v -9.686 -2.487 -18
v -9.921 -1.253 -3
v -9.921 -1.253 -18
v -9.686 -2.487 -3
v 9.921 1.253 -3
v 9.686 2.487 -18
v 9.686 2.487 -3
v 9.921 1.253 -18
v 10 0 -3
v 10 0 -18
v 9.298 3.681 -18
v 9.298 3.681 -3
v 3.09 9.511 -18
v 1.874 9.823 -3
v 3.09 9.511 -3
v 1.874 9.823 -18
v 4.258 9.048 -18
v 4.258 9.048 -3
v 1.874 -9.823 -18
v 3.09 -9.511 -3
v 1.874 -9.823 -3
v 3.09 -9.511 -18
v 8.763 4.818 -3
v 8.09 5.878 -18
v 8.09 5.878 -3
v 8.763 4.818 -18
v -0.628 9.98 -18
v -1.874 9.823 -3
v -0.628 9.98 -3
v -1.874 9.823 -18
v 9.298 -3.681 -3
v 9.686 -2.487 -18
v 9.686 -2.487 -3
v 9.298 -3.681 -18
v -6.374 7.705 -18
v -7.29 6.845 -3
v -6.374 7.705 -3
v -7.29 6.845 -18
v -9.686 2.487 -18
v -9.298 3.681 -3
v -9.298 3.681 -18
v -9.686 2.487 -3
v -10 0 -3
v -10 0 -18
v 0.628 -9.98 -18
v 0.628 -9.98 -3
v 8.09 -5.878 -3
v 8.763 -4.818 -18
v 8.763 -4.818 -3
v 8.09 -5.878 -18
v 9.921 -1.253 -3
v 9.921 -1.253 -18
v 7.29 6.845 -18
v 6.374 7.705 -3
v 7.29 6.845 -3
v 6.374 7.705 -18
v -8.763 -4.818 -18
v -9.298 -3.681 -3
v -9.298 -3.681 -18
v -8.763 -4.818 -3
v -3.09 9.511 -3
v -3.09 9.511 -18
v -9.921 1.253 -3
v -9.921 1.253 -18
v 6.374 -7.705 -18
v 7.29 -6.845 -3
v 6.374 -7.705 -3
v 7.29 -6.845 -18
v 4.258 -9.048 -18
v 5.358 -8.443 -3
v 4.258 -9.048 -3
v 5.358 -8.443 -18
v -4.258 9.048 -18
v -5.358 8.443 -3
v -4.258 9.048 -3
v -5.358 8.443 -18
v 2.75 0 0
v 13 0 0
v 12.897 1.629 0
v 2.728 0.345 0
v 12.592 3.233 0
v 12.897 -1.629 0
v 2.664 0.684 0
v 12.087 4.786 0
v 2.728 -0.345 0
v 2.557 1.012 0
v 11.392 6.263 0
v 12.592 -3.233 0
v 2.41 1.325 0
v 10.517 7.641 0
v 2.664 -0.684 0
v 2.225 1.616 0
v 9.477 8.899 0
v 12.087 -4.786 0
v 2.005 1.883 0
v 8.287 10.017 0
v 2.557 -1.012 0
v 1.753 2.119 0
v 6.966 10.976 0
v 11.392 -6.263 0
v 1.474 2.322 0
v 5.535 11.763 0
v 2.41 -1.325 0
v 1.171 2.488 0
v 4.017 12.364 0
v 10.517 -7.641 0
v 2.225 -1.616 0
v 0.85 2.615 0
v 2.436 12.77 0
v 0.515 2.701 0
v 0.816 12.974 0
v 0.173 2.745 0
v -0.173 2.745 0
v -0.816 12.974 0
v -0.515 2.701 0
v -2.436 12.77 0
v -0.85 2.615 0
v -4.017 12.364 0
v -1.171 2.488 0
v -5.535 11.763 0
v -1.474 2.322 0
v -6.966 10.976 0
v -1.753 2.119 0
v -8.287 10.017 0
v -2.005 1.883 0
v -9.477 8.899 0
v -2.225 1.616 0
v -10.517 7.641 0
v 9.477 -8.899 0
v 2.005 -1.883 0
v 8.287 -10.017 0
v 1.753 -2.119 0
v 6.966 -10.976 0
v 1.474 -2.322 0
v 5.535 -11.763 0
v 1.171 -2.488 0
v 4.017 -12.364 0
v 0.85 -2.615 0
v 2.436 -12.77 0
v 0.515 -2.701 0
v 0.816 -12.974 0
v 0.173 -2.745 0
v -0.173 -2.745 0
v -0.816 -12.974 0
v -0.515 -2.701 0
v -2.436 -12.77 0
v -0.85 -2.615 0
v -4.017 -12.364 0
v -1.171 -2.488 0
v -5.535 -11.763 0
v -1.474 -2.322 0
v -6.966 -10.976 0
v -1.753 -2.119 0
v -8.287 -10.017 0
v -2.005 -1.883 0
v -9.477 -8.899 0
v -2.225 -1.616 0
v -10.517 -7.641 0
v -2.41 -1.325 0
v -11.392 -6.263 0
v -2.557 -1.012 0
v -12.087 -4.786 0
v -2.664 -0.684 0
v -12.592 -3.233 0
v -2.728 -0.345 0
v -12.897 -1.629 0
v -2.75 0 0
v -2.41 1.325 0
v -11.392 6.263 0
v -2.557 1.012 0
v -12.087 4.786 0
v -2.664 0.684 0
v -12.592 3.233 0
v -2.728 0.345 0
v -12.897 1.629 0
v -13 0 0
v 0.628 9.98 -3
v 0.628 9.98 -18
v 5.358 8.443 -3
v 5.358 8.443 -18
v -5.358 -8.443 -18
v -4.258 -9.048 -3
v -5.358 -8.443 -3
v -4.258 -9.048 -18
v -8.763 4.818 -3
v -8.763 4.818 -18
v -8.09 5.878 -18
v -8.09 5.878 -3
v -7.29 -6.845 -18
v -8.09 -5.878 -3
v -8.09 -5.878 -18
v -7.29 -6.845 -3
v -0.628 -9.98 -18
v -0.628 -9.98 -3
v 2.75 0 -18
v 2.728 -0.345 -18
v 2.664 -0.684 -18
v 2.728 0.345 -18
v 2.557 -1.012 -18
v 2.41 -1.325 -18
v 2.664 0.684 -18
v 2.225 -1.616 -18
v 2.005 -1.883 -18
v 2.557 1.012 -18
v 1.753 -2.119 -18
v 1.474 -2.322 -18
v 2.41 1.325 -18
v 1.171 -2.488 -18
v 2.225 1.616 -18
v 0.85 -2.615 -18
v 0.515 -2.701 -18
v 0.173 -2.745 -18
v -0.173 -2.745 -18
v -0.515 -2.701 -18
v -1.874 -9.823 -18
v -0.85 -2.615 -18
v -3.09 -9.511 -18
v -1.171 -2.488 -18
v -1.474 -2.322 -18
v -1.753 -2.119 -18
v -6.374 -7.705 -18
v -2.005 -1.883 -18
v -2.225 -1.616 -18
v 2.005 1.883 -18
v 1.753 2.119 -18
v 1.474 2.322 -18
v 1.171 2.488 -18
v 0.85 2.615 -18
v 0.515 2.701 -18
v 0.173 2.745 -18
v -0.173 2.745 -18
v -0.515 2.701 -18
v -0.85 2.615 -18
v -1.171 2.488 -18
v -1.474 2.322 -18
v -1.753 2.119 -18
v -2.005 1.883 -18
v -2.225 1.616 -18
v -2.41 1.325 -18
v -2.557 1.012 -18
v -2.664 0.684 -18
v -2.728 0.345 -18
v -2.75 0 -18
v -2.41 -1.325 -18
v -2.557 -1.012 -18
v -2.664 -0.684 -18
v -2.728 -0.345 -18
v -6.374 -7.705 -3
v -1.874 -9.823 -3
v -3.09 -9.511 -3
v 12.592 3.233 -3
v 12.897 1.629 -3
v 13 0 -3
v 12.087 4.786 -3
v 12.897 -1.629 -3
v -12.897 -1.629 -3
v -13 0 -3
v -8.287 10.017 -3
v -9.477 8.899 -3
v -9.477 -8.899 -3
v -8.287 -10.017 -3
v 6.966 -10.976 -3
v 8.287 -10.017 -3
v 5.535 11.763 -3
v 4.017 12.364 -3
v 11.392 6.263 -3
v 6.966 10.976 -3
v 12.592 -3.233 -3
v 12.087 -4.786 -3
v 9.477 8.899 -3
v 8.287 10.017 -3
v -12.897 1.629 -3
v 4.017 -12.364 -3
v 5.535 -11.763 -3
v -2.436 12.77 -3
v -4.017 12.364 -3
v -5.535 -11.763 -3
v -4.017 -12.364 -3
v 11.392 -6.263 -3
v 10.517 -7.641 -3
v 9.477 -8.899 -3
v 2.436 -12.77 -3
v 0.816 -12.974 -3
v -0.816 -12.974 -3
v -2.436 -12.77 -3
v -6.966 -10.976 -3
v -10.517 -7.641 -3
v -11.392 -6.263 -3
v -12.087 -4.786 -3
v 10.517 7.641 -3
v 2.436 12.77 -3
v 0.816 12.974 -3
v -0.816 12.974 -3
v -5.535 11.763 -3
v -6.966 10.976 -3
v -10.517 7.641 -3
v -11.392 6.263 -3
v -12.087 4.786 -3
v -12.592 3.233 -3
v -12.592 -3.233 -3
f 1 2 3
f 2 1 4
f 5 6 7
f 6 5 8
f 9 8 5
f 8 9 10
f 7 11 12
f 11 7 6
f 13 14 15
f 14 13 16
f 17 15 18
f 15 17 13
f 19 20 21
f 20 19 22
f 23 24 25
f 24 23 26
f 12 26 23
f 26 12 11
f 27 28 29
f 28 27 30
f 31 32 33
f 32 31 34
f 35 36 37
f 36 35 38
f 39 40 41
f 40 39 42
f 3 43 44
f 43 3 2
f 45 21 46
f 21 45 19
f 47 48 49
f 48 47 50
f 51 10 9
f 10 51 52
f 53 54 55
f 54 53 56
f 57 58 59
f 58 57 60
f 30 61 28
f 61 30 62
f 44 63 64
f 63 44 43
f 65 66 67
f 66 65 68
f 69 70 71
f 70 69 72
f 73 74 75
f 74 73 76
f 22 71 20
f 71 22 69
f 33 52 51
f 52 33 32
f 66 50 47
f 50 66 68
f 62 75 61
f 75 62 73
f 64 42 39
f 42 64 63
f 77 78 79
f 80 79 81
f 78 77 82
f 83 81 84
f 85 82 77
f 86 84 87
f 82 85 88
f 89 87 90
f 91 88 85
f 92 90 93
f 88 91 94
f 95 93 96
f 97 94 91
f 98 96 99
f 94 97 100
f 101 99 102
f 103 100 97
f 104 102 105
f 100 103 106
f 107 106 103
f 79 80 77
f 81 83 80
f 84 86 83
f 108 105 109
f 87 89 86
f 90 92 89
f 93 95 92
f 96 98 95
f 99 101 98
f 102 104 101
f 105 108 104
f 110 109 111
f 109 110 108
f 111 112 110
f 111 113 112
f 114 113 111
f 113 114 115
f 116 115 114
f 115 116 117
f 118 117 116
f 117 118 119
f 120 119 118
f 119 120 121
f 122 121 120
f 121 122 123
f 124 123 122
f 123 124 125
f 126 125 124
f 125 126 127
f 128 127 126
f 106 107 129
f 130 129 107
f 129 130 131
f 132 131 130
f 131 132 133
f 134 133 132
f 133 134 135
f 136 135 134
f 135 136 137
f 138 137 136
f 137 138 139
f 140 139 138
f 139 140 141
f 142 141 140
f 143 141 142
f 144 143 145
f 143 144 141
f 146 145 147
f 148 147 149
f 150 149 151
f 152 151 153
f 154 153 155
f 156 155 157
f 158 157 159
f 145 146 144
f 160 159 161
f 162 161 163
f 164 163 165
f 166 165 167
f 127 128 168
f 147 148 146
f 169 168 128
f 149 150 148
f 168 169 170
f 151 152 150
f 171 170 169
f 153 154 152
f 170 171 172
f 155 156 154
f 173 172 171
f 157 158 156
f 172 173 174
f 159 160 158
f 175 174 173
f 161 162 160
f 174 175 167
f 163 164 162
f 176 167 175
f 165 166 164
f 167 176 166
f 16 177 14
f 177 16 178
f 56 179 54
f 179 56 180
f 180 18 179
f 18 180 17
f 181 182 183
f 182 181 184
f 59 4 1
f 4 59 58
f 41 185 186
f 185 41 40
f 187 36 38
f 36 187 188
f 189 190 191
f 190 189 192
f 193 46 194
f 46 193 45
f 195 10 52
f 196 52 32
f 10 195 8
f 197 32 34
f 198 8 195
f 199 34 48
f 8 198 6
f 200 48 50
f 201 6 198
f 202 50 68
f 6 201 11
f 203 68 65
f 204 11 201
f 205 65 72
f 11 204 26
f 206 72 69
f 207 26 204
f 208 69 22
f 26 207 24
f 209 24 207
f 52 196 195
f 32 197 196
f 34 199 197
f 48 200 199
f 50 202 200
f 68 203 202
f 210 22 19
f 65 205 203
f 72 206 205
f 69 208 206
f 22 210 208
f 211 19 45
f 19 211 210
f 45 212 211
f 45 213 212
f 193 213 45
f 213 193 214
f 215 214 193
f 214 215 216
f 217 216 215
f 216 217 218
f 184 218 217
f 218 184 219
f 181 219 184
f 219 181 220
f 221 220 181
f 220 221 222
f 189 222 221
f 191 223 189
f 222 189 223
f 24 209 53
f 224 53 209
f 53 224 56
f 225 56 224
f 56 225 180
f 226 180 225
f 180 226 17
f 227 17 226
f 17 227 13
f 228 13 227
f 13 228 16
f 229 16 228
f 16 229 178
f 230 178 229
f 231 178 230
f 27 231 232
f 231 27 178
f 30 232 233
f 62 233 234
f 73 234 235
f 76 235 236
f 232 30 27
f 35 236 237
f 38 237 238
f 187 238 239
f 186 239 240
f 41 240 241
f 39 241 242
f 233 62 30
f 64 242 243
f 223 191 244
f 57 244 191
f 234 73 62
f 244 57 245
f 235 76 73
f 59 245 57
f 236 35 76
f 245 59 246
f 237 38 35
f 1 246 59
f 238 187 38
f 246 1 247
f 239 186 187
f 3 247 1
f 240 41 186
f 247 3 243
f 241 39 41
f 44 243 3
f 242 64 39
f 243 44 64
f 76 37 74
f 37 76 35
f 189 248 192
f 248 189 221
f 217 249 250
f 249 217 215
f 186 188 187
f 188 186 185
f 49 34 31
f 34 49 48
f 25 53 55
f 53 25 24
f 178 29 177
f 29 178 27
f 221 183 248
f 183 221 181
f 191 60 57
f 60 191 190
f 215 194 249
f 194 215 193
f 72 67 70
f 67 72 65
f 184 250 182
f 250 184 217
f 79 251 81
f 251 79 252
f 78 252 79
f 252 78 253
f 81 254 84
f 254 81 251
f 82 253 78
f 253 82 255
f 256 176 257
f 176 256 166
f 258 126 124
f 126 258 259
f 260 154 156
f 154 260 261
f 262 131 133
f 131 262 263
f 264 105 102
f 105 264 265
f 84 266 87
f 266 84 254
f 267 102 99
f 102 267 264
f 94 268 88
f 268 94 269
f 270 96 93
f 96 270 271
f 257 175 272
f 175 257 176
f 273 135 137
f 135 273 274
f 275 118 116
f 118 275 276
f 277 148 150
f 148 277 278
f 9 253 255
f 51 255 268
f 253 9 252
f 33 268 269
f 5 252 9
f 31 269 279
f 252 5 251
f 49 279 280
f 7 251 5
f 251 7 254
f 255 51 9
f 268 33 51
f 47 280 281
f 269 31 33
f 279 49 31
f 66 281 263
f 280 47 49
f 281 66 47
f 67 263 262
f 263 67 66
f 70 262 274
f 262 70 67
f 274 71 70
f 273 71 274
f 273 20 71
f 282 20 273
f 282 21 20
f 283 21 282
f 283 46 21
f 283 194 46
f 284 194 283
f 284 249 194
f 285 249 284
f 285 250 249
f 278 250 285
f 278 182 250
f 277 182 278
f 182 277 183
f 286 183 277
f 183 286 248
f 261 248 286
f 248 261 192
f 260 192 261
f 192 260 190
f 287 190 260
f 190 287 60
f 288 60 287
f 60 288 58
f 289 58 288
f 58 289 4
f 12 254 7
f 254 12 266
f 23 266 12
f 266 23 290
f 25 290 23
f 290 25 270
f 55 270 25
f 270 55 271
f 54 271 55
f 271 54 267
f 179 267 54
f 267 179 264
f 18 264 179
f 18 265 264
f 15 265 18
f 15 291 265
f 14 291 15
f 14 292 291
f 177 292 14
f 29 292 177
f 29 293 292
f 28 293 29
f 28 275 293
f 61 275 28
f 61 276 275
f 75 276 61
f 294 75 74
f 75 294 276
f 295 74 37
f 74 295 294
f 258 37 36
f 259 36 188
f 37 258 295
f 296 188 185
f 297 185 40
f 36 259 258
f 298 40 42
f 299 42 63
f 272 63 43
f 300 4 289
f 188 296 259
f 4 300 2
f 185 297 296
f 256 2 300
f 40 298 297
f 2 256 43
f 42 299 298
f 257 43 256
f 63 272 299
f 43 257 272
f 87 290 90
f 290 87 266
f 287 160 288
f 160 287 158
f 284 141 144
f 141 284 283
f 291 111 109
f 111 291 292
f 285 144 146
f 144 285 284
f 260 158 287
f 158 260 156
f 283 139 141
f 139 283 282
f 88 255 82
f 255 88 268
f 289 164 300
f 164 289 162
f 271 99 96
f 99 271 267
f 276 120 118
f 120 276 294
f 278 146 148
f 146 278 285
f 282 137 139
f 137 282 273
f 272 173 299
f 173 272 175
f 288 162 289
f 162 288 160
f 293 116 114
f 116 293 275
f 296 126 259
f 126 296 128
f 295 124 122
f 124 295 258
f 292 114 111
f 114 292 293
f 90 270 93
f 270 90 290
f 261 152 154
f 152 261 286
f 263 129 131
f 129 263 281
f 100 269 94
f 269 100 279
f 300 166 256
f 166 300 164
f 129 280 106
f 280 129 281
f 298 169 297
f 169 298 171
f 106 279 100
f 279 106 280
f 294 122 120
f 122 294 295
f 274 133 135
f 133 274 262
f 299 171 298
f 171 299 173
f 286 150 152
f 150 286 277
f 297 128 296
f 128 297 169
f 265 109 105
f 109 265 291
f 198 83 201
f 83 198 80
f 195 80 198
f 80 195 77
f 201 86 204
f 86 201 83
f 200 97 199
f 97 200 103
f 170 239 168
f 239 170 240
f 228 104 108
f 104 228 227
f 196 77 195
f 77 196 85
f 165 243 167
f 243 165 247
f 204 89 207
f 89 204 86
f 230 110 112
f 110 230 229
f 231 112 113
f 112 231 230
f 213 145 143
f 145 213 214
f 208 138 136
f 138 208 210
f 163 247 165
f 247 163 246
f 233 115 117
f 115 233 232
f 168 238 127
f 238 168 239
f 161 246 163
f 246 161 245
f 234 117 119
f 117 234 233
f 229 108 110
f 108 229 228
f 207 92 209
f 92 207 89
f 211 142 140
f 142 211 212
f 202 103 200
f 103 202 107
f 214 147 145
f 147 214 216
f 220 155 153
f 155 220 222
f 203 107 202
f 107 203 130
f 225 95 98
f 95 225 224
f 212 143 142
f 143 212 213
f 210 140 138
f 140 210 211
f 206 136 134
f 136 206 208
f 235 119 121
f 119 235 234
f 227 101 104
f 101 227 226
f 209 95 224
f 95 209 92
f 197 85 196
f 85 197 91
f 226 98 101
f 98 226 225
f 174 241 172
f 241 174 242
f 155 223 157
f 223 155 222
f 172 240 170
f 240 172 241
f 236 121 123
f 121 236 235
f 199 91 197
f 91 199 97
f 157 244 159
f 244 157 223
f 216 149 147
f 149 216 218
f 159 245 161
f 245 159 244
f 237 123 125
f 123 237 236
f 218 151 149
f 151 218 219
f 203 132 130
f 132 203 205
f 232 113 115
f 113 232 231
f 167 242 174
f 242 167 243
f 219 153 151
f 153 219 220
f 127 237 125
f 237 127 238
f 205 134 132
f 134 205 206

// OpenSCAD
$fn = 50;


difference() {
	union() {
		translate(v = [0, 0, -18.0000000000]) {
			cylinder(h = 18, r = 10.0000000000);
		}
		translate(v = [0, 0, -3.0000000000]) {
			cylinder(h = 3, r = 13.0000000000);
		}
	}
	union() {
		#translate(v = [0, 0, -18]) {
			cylinder(h = 18, r = 2.7500000000);
		}
	}
}
